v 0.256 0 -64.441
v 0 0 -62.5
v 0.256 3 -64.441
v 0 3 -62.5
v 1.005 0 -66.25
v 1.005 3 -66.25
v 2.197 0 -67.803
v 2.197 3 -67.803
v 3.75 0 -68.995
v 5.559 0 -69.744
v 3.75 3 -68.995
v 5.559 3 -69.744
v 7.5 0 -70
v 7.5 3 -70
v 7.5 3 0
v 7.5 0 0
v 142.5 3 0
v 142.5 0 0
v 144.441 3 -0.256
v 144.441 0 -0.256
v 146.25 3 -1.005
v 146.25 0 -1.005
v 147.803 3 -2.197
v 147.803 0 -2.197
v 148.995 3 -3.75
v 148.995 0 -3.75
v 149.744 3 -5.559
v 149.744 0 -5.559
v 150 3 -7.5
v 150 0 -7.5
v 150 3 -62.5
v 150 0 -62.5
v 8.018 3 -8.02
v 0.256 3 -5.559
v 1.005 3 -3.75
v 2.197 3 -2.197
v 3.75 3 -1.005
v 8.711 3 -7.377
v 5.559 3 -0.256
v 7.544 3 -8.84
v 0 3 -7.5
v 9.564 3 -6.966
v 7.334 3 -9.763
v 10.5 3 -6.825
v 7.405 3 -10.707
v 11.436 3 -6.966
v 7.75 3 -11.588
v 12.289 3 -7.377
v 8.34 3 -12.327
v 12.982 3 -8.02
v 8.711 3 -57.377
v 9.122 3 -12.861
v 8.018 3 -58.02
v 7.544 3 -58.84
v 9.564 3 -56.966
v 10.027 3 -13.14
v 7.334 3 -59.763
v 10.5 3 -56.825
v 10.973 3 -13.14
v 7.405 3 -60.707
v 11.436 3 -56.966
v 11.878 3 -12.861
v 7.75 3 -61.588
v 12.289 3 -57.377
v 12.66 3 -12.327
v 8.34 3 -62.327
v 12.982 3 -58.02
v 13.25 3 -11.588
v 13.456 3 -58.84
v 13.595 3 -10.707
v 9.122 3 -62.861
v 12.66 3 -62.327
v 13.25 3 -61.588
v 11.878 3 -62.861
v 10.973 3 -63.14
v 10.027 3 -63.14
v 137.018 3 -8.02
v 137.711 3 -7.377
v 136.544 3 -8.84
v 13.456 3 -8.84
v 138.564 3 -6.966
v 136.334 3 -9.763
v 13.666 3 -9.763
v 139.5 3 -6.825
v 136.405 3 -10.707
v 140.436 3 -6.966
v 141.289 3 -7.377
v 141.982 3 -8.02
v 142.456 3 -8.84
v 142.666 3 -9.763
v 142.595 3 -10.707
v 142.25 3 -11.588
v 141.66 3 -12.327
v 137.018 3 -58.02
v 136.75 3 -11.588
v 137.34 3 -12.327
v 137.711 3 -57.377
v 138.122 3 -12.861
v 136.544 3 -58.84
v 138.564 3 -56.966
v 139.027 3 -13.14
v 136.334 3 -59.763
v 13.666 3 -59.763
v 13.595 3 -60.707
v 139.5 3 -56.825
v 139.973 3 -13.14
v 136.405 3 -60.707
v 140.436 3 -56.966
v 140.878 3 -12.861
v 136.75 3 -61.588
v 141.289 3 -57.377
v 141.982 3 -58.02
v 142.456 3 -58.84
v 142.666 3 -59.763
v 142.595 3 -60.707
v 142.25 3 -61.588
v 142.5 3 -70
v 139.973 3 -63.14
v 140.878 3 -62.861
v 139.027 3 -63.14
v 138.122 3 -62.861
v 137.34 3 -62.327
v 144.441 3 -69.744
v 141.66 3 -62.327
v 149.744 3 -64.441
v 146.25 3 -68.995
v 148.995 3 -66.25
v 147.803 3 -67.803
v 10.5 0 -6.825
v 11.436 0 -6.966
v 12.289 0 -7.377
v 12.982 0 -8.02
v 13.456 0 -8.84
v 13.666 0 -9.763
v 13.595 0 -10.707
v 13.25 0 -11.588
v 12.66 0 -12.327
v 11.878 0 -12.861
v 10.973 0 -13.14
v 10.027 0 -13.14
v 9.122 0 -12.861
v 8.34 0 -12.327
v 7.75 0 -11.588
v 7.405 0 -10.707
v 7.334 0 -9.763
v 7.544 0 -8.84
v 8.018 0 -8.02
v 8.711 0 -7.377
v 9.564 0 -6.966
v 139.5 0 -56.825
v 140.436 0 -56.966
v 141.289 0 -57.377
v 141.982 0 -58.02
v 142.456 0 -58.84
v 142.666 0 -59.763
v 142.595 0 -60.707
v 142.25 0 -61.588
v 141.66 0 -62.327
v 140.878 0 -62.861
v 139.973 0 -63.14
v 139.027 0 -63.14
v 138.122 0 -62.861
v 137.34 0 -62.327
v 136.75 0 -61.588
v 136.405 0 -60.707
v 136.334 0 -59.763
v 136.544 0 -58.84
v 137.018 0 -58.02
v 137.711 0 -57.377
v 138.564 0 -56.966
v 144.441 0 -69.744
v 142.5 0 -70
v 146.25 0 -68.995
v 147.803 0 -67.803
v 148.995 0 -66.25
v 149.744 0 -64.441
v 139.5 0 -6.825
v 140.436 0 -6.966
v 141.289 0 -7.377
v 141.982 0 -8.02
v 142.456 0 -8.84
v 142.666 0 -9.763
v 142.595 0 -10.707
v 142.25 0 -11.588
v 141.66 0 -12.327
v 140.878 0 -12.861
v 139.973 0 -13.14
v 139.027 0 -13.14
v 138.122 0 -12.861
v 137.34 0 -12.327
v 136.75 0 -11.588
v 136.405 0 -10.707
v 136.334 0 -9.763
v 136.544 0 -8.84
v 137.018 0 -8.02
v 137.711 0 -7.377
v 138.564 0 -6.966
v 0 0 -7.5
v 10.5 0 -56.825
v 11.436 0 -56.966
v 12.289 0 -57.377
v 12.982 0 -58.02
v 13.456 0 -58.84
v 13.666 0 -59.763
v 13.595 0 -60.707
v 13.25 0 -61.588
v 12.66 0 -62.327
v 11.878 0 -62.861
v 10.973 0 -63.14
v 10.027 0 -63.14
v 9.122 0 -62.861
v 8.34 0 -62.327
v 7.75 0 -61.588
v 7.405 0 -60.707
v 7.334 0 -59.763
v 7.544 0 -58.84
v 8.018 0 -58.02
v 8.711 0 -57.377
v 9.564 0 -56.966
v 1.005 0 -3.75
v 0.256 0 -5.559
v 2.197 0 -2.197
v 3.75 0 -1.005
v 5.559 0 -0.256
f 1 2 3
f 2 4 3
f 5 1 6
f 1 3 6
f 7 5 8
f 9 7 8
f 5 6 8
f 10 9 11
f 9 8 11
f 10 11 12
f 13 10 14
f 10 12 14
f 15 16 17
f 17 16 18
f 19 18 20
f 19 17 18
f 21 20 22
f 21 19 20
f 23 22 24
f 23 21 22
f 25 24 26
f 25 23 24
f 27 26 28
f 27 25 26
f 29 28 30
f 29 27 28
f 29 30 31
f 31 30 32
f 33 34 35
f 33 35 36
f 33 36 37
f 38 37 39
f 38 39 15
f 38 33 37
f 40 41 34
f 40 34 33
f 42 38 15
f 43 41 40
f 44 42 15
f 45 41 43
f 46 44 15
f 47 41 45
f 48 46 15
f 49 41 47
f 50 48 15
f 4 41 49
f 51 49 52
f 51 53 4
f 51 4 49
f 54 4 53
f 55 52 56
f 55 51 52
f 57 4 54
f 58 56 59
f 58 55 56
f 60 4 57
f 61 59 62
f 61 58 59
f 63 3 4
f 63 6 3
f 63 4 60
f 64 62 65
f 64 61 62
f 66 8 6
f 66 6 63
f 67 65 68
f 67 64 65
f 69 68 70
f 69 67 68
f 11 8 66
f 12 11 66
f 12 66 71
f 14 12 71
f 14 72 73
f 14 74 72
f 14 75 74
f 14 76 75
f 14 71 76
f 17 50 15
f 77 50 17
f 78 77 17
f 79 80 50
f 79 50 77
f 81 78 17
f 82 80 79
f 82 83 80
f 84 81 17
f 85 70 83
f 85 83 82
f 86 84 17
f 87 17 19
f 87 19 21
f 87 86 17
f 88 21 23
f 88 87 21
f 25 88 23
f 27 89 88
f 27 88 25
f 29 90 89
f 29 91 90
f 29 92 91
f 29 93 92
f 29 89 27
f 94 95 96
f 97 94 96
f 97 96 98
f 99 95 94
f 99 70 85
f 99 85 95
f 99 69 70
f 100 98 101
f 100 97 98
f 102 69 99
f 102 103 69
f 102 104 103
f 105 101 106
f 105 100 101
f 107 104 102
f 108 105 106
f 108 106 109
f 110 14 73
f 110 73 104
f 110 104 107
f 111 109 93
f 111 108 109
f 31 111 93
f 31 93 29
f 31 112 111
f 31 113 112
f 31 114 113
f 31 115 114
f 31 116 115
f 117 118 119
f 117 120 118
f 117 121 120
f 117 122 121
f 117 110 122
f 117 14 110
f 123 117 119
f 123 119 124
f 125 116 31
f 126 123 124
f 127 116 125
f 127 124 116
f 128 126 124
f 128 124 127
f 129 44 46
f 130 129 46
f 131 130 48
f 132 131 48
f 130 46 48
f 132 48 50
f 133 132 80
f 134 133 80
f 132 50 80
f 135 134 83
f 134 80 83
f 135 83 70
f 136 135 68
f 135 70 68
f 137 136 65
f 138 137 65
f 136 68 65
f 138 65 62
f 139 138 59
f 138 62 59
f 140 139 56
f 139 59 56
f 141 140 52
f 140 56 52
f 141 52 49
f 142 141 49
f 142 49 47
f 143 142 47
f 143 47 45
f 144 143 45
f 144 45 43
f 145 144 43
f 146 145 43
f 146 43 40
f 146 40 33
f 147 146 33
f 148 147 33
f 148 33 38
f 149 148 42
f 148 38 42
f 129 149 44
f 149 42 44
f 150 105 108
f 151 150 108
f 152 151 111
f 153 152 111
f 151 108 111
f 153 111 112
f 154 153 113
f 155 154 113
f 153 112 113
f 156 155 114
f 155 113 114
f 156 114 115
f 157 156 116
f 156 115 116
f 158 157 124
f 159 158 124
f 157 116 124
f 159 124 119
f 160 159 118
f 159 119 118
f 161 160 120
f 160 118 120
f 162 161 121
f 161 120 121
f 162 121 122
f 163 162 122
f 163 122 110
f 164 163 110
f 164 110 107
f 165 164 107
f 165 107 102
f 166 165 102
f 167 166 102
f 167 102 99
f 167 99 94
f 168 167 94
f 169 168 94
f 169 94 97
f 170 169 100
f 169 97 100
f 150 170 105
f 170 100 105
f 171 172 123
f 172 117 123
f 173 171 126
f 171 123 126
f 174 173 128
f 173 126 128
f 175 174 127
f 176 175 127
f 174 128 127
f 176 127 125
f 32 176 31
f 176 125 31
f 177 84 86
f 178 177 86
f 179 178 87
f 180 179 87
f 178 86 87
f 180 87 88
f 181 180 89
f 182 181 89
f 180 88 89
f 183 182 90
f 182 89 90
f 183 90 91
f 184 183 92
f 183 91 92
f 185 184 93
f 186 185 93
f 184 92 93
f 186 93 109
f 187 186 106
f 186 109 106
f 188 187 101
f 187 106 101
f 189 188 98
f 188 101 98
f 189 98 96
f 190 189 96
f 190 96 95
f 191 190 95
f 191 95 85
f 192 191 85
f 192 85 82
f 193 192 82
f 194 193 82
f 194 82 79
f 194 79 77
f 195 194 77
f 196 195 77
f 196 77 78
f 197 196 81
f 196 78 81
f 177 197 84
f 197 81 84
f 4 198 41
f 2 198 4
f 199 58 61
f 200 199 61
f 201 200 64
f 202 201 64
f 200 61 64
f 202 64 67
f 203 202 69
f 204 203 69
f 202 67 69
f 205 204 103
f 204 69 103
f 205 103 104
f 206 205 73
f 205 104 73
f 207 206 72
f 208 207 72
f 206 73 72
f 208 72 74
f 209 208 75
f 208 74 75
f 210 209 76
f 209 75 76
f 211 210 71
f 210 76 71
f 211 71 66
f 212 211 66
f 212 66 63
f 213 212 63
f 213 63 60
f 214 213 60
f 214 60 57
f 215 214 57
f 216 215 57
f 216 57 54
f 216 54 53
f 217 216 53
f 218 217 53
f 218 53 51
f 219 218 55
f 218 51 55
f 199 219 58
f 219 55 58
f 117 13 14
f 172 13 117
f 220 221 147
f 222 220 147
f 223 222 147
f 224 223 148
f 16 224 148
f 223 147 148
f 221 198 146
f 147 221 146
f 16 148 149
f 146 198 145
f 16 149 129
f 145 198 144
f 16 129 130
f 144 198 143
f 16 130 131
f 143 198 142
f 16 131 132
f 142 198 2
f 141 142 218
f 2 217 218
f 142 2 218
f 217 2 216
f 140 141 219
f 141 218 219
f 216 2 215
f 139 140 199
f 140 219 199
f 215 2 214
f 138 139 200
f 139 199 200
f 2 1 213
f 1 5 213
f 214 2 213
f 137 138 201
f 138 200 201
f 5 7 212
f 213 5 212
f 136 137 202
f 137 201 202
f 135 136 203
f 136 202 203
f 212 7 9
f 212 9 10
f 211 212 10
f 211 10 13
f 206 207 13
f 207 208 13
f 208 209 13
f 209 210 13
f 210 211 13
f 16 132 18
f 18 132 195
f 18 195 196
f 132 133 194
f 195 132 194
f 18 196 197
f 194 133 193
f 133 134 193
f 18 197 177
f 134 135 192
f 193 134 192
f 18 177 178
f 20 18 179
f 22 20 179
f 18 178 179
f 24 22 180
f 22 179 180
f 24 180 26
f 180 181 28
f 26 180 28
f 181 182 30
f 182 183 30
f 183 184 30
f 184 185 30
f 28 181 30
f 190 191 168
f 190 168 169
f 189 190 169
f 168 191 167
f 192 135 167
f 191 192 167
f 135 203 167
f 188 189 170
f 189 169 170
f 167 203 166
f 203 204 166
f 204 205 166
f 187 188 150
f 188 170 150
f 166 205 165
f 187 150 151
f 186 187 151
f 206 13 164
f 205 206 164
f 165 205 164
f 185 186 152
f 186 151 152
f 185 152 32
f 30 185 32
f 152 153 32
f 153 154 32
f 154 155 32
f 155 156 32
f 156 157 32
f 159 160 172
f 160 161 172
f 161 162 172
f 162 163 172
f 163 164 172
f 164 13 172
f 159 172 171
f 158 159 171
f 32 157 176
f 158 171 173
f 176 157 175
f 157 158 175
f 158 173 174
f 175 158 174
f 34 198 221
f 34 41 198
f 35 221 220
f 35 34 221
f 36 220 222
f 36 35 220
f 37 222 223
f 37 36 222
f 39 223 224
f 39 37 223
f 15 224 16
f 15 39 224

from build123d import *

# Parameters (mm, degrees)
ESBO_O2_W                = 150
ESBO_O2_H                = 70
RESSALTO_EXTRUS_O1_DEPTH = 3
ESBO_O4_R                = 3.175
CORTE_EXTRUS_O1_DEPTH    = 3
FILETE1_R                = 7.5


with BuildPart() as part:
    # Esboço2 → Ressalto-extrusão1 (new body)
    with BuildSketch(Plane(origin=(0, 0, 0), x_dir=(1, 0, 0), z_dir=(0, 1, 0))):
        with Locations((75, 35)):
            Rectangle(ESBO_O2_W, ESBO_O2_H)
    extrude(amount=RESSALTO_EXTRUS_O1_DEPTH)

    # Esboço4 → Corte-extrusão1 (cut)
    with BuildSketch(Plane(origin=(0, 3, 0), x_dir=(1, 0, 0), z_dir=(0, 1, 0))):
        with Locations(Location((10.5, 60, 0), (0, 0, 270))):
            Circle(ESBO_O4_R)
        with Locations(Location((139.5, 60, 0), (0, 0, 270))):
            Circle(ESBO_O4_R)
        with Locations(Location((139.5, 10, 0), (0, 0, 270))):
            Circle(ESBO_O4_R)
        with Locations(Location((10.5, 10, 0), (0, 0, 270))):
            Circle(ESBO_O4_R)
    extrude(amount=-CORTE_EXTRUS_O1_DEPTH, mode=Mode.SUBTRACT)

    # Filete1
    filete1_edges = [part.edges().sort_by_distance(p)[0] for p in [
        (0, 1.5, -70),
        (150, 1.5, -70),
        (150, 1.5, 0),
        (0, 1.5, 0),
    ]]
    fillet(filete1_edges, radius=FILETE1_R)


solid = part.part
